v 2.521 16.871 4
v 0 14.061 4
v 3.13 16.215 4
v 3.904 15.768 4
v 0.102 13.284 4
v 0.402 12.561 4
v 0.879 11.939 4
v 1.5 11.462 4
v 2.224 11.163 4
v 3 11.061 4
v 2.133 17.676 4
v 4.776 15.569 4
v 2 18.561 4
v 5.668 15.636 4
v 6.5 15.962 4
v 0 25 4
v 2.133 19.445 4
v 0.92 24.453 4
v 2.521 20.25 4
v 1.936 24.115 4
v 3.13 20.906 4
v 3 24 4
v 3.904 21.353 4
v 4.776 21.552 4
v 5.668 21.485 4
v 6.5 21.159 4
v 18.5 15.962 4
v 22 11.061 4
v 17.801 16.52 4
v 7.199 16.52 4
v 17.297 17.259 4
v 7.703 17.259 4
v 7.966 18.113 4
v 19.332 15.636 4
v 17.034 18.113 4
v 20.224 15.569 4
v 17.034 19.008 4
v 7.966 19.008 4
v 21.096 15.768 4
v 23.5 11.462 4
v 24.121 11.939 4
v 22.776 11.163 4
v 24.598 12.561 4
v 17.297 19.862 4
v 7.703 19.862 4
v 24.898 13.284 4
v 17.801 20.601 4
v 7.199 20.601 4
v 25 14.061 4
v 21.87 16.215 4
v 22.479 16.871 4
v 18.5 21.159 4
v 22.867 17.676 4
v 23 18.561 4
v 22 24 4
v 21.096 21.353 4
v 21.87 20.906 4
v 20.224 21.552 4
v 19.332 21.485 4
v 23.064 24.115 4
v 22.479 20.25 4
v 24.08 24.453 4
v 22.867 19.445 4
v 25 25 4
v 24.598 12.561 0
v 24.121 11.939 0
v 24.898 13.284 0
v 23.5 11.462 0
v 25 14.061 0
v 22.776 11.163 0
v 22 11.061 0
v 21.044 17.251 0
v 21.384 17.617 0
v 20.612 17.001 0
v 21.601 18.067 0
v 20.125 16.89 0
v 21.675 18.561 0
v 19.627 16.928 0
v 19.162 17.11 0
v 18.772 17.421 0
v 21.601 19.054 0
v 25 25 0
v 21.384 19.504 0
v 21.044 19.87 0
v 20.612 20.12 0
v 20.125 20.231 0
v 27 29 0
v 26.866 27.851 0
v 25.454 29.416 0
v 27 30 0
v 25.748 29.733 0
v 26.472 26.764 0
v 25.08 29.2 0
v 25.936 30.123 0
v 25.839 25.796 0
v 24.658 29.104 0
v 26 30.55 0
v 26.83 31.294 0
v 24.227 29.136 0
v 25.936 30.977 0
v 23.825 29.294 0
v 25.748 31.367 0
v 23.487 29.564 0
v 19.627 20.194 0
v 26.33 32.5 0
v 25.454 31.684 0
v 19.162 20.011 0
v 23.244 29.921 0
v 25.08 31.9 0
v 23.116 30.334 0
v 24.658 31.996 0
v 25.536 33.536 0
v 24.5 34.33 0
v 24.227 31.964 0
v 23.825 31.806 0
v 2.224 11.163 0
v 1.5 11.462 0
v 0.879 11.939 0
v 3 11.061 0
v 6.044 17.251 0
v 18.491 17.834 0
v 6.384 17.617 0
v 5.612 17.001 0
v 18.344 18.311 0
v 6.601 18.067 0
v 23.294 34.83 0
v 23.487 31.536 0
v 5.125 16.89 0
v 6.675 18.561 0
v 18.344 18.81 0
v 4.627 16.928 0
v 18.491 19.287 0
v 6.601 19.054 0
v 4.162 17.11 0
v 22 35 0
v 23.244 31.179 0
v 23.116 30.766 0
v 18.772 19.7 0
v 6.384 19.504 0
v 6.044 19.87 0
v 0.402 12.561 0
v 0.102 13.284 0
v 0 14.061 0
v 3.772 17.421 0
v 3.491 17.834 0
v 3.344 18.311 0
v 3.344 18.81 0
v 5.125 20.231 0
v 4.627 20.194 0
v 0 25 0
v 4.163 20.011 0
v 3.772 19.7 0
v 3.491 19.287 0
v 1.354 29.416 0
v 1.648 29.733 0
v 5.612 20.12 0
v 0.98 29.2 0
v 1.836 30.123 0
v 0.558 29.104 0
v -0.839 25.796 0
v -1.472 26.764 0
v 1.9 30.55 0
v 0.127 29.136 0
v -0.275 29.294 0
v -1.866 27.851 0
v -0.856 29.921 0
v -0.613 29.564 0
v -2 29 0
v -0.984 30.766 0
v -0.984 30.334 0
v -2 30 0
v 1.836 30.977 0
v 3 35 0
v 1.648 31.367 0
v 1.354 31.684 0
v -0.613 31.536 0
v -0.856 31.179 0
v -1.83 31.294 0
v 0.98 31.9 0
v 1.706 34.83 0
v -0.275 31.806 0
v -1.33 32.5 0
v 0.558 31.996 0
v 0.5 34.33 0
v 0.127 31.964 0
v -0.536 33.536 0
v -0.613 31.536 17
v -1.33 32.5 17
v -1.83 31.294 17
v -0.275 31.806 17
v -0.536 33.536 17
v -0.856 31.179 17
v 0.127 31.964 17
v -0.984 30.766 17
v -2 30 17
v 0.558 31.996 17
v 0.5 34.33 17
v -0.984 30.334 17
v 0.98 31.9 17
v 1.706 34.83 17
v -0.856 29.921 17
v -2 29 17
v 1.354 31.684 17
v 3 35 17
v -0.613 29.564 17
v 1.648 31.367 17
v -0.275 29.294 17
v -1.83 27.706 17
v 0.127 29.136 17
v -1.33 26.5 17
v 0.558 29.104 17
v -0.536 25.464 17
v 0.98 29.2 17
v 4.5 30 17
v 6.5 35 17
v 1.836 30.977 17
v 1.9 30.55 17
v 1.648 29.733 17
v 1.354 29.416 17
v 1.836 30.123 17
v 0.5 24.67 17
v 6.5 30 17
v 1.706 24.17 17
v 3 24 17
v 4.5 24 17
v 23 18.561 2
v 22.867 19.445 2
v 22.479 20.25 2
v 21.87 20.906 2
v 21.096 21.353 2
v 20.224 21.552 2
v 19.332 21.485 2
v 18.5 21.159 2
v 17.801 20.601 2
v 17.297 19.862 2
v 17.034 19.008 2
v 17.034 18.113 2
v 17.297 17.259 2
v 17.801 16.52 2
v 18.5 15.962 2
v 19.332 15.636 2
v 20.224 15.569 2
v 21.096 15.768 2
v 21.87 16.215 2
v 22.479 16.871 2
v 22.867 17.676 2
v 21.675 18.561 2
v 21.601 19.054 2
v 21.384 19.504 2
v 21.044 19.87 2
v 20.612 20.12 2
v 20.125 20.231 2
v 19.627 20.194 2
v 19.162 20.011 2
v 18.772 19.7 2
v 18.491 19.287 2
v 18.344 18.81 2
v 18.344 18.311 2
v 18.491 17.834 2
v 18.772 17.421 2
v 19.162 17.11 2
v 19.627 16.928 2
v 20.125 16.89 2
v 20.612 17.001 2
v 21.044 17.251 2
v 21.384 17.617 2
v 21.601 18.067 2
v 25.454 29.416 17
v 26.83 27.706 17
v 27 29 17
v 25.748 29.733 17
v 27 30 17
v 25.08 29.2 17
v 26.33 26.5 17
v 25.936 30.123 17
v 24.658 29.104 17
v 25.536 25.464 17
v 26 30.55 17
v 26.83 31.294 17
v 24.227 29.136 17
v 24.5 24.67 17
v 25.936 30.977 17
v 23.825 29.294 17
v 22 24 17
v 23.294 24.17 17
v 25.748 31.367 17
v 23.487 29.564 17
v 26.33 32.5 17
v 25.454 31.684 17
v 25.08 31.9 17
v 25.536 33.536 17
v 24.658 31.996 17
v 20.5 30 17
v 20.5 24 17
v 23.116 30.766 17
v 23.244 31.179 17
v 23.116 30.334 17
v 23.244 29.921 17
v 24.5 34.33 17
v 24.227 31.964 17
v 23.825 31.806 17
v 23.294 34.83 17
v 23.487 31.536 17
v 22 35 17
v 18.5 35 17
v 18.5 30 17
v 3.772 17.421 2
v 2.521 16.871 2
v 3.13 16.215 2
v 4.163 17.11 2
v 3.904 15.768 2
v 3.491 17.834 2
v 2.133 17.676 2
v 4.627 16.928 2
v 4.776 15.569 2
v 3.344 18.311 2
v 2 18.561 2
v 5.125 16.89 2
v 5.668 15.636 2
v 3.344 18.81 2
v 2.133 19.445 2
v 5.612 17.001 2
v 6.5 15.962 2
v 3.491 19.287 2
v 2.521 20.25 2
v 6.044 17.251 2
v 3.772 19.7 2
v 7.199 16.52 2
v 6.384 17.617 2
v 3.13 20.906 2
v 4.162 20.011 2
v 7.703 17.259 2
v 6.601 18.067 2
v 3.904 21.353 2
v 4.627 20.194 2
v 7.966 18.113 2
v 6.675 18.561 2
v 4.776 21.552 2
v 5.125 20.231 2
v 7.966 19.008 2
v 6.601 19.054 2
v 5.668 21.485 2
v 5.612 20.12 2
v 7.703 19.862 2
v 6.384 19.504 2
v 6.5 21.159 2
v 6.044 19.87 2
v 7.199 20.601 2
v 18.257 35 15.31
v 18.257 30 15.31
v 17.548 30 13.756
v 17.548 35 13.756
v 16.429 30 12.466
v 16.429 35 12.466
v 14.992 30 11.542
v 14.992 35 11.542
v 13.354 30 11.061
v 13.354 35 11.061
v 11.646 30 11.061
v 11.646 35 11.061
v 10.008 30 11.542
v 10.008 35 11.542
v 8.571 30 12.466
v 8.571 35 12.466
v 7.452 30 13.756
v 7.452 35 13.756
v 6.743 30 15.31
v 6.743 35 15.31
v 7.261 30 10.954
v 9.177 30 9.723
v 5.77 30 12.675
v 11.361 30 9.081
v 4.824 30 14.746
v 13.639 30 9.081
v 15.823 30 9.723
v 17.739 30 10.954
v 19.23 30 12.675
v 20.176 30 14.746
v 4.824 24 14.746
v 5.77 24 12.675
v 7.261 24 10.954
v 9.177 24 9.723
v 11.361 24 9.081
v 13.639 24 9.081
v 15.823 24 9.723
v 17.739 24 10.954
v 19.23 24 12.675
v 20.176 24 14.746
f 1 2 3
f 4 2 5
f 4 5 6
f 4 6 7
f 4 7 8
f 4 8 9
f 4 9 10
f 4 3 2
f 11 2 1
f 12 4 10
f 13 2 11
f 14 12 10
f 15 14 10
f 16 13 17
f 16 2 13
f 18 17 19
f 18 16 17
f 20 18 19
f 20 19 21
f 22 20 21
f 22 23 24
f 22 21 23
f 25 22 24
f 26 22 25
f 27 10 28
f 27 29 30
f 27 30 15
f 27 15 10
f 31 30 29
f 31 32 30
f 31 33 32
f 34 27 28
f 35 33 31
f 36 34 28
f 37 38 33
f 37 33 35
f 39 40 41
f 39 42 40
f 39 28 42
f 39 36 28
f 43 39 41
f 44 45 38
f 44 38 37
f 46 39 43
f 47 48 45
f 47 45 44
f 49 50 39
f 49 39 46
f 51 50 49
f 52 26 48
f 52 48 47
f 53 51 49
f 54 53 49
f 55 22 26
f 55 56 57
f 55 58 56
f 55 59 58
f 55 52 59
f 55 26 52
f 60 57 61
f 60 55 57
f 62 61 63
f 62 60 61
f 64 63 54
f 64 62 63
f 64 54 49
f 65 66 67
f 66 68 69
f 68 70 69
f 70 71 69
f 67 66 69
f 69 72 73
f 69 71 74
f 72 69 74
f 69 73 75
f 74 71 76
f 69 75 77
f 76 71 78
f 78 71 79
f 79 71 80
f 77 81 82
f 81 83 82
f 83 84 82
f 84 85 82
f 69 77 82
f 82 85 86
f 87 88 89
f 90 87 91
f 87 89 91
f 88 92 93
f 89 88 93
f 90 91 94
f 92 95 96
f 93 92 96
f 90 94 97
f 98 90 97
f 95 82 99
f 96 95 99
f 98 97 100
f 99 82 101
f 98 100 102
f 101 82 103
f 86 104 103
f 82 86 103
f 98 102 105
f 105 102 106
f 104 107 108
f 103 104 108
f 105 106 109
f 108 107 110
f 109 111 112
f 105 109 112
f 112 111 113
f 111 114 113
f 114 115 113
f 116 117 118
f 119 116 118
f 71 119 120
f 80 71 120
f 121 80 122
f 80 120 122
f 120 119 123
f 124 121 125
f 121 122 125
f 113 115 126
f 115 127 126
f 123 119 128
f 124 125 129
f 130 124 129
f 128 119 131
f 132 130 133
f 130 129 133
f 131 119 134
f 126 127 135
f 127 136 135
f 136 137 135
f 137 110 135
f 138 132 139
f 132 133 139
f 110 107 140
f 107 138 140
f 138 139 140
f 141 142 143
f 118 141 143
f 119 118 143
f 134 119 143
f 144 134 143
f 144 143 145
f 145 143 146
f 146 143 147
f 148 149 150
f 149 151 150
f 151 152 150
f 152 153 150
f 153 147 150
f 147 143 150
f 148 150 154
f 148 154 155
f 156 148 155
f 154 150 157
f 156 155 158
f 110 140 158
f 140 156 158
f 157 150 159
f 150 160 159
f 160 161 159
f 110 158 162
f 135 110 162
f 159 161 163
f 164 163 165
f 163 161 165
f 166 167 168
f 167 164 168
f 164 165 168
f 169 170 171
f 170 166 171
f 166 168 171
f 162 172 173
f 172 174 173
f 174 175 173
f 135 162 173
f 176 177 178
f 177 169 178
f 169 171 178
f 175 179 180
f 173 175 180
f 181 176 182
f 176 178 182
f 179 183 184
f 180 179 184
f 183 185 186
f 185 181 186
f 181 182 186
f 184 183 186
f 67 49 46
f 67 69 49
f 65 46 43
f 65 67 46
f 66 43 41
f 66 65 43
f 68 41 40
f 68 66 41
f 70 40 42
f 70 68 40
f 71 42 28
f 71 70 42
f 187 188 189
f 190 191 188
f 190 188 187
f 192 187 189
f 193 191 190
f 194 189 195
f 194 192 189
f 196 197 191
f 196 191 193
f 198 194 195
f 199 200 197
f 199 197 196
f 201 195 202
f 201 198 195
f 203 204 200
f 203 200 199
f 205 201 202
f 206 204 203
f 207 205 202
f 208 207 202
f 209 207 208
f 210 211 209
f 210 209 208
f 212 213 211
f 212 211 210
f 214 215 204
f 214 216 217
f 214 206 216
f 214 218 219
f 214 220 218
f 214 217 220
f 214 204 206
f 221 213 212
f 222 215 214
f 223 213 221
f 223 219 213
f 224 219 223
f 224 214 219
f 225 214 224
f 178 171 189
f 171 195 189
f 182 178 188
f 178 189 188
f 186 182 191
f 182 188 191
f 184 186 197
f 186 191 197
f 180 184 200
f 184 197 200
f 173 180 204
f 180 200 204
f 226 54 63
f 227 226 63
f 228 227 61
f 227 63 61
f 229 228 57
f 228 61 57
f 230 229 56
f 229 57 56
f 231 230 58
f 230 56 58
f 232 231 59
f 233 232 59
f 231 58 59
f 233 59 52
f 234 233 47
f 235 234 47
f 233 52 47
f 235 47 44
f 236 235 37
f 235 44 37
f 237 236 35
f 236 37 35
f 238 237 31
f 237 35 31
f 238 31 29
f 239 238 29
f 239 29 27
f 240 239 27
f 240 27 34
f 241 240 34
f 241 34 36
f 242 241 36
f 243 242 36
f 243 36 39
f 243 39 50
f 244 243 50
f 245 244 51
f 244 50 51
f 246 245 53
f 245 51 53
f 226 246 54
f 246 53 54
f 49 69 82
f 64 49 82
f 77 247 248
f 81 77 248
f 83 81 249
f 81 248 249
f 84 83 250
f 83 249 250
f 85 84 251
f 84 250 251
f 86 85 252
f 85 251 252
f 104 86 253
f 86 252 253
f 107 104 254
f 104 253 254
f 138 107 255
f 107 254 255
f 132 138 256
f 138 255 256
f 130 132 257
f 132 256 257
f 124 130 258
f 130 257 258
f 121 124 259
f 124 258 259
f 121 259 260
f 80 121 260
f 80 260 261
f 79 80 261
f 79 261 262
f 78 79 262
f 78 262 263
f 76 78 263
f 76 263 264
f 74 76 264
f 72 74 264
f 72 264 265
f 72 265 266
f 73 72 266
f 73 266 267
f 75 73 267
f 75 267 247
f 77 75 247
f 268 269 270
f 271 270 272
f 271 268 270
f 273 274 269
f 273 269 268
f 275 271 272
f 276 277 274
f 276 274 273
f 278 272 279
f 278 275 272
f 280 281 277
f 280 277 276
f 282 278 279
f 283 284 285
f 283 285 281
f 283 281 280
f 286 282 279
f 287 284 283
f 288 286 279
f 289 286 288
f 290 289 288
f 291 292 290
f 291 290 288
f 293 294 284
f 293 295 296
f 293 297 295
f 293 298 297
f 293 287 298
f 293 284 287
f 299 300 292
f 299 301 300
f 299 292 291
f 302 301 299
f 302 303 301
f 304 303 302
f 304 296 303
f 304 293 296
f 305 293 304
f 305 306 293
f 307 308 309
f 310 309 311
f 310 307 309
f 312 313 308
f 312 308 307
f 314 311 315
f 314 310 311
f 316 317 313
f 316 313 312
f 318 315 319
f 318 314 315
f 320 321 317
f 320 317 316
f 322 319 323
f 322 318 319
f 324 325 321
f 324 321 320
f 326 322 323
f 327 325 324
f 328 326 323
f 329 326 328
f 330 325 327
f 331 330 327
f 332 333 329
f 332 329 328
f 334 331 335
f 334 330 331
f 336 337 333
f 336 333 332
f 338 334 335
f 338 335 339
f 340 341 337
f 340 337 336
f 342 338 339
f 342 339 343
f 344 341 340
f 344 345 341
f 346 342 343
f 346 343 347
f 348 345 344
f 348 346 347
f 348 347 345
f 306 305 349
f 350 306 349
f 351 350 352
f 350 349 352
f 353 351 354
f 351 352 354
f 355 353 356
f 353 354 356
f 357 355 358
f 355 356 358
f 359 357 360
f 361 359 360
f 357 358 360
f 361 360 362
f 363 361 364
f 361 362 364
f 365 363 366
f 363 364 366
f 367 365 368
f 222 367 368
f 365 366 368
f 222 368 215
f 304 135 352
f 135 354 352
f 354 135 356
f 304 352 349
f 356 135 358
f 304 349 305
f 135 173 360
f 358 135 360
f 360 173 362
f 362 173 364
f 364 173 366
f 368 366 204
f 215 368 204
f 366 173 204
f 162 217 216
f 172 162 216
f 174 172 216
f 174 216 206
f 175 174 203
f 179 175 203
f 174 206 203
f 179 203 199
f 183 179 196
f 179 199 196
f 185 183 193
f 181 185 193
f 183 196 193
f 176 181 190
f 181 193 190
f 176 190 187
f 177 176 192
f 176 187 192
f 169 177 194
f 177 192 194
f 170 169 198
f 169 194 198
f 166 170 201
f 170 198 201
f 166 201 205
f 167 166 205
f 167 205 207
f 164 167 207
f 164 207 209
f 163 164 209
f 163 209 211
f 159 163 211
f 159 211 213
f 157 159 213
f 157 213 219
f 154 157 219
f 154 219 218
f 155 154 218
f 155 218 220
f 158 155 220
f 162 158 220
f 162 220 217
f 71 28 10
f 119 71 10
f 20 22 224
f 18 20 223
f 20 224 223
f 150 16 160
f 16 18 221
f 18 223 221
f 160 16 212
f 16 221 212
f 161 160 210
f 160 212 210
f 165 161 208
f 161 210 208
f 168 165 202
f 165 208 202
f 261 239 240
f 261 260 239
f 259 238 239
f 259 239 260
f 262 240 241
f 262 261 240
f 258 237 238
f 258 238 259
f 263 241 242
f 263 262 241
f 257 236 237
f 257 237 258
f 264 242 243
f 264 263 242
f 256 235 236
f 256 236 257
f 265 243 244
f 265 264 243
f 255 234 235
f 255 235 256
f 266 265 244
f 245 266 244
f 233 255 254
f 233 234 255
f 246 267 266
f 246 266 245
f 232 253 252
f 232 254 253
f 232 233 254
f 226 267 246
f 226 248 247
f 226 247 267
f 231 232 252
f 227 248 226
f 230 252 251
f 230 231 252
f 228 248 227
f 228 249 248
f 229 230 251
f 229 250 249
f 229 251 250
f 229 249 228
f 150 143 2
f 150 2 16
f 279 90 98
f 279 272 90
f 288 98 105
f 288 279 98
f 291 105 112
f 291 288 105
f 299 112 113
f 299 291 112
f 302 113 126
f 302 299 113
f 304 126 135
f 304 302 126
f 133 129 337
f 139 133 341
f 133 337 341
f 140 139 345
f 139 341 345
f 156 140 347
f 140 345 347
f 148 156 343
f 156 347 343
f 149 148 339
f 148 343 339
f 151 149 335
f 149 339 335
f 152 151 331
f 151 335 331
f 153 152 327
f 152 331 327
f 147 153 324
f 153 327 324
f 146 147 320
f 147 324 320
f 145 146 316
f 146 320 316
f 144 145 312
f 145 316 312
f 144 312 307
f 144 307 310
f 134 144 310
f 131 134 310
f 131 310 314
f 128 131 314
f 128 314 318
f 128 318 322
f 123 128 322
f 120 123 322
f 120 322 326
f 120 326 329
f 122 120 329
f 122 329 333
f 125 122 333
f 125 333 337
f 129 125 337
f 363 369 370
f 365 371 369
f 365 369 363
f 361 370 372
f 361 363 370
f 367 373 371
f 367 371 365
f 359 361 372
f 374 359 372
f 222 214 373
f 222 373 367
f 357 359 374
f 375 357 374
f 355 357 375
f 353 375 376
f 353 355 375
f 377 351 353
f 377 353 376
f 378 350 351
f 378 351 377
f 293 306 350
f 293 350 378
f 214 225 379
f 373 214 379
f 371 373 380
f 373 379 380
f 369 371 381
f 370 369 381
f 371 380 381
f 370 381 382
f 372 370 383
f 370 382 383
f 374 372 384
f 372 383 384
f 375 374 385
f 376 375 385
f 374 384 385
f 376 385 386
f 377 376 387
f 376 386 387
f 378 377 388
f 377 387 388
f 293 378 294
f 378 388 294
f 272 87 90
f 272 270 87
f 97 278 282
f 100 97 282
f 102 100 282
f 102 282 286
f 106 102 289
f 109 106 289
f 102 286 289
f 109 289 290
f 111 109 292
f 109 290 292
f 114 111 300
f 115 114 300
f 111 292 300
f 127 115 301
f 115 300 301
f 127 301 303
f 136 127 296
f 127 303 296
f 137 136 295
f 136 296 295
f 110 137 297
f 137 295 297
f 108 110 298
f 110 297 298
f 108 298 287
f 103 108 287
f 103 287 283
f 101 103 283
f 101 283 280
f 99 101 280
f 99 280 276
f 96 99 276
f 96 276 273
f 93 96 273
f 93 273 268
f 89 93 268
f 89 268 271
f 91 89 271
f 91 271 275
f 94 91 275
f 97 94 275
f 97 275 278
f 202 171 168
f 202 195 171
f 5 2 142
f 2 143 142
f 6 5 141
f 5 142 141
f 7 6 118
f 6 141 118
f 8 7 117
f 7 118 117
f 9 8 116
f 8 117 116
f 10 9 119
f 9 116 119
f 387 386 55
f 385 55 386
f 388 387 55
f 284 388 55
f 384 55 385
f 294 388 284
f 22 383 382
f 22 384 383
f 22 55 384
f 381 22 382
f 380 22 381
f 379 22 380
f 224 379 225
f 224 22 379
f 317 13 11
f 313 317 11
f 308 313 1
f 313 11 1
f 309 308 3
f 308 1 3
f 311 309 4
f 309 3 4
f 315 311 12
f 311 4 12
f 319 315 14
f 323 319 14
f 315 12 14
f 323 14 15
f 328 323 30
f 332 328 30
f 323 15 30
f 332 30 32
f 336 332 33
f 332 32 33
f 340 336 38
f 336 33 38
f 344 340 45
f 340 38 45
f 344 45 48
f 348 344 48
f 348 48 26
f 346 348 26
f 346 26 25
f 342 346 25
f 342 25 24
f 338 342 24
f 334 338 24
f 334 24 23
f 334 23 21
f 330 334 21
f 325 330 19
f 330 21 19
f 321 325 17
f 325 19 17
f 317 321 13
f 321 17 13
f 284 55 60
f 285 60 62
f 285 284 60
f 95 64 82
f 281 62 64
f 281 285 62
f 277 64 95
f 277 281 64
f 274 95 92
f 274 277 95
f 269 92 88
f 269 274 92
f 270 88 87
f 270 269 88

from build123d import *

# Parameters (mm, degrees)
F0_W      = 25
F0_H      = 35
F1_DEPTH  = 4
F2_R      = 1.675
F3_DEPTH  = 25
F4_W      = 25
F4_H      = 11
F5_DEPTH  = 13
F7_DEPTH  = 6
F8_R      = 8
F9_DEPTH  = 6
F2_R_2    = 3
F10_DEPTH = 2
F11_R     = 5
F12_W     = 11
F12_H     = 17
F13_DEPTH = 2
F14_W     = 11
F14_H     = 17
F15_DEPTH = 2
F16_R     = 1.45
F17_DEPTH = 25
F18_R     = 5
F20_DEPTH = 25
F21_R     = 3


with BuildPart() as f1:
    # F0 (on Top) → F1 (new body)
    with BuildSketch(Plane.XY):
        with Locations((12.5, 17.5)):
            Rectangle(F0_W, F0_H)
    extrude(amount=F1_DEPTH)

    # F2 (on face) → F3 (cut)
    with BuildSketch(Plane.XY.offset(4)):
        with BuildLine():
            ThreePointArc((3.325, 18.5605346784), (5, 16.8855346784), (6.675, 18.5605346784))
            ThreePointArc((6.675, 18.5605346784), (5, 20.2355346784), (3.325, 18.5605346784))
        make_face()
        with Locations((20, 18.5605346784)):
            Circle(F2_R)
        with Locations((20, 3.5605346784)):
            Circle(F2_R)
        with Locations((5, 3.5605346784)):
            Circle(F2_R)
    extrude(amount=-F3_DEPTH, mode=Mode.SUBTRACT)

    # F4 (on face) → F5 (join)
    with BuildSketch(Plane.XY.offset(4)):
        with Locations((12.5, 29.5)):
            Rectangle(F4_W, F4_H)
    extrude(amount=F5_DEPTH)

    # F6 (on face) → F7 (cut)
    with BuildSketch(Plane(origin=(0, 35, 0), x_dir=(-1, 0, 0), z_dir=(0, 1, 0))):
        with BuildLine():
            ThreePointArc((-18.5, 17), (-12.5, 11), (-6.5, 17))
            Line((-6.5, 17), (-18.5, 17))
        make_face()
    extrude(amount=-F7_DEPTH, mode=Mode.SUBTRACT)

    # F8 (on face) → F9 (cut)
    with BuildSketch(Plane.XZ.offset(-24)):
        with Locations((12.5, 17)):
            Circle(F8_R)
    extrude(amount=-F9_DEPTH, mode=Mode.SUBTRACT)

    # F2 (on face) → F10 (cut)
    with BuildSketch(Plane.XY.offset(4)):
        with BuildLine():
            ThreePointArc((8, 18.5605346784), (5, 21.5605346784), (2, 18.5605346784))
            ThreePointArc((2, 18.5605346784), (5, 15.5605346784), (8, 18.5605346784))
        make_face()
        with BuildLine():
            ThreePointArc((3.325, 18.5605346784), (5, 20.2355346784), (6.675, 18.5605346784))
            ThreePointArc((6.675, 18.5605346784), (5, 16.8855346784), (3.325, 18.5605346784))
        make_face(mode=Mode.SUBTRACT)
        with Locations((20, 18.5605346784)):
            Circle(F2_R_2)
        with Locations((20, 18.5605346784)):
            Circle(F2_R, mode=Mode.SUBTRACT)
        with Locations((20, 3.5605346784)):
            Circle(F2_R_2)
        with Locations((20, 3.5605346784)):
            Circle(F2_R, mode=Mode.SUBTRACT)
        with Locations((5, 3.5605346784)):
            Circle(F2_R_2)
        with Locations((5, 3.5605346784)):
            Circle(F2_R, mode=Mode.SUBTRACT)
    extrude(amount=-F10_DEPTH, mode=Mode.SUBTRACT)

    # F11
    f11_edges = [f1.edges().sort_by_distance(p)[0] for p in [
        (0, 0, 2),
        (25, 0, 2),
    ]]
    fillet(f11_edges, radius=F11_R)

    # F12 (on face) → F13 (join)
    with BuildSketch(Plane(origin=(0, 0, 0), x_dir=(0, -1, 0), z_dir=(-1, 0, 0))):
        with Locations((-29.5, 8.5)):
            Rectangle(F12_W, F12_H)
    extrude(amount=F13_DEPTH)

    # F14 (on face) → F15 (join)
    with BuildSketch(Plane.YZ.offset(25)):
        with Locations((29.5, 8.5)):
            Rectangle(F14_W, F14_H)
    extrude(amount=F15_DEPTH)

    # F16 (on face) → F17 (cut)
    with BuildSketch(Plane.XY.offset(17)):
        with Locations((0.45, 30.55)):
            Circle(F16_R)
        with Locations((24.55, 30.55)):
            Circle(F16_R)
    extrude(amount=-F17_DEPTH, mode=Mode.SUBTRACT)

    # F18
    f18_edges = [f1.edges().sort_by_distance(p)[0] for p in [
        (-2, 24, 8.5),
        (-2, 35, 8.5),
        (27, 35, 8.5),
        (27, 24, 8.5),
    ]]
    fillet(f18_edges, radius=F18_R)

    # F19 (on face) → F20 (cut)
    with BuildSketch(Plane.XY.offset(4)):
        Polygon((5, 11.0605346784), (0, 11.0605346784), (0, 5), (0, -4.7260266729), (29.4526517391, -4.7260266729), (29.4526517391, 11.0605346784), (25, 11.0605346784), align=None)
    extrude(amount=-F20_DEPTH, mode=Mode.SUBTRACT)

    # F21
    f21_edges = [f1.edges().sort_by_distance(p)[0] for p in [
        (0, 11.060535, 2),
        (25, 11.060535, 2),
    ]]
    fillet(f21_edges, radius=F21_R)


solid = f1.part
